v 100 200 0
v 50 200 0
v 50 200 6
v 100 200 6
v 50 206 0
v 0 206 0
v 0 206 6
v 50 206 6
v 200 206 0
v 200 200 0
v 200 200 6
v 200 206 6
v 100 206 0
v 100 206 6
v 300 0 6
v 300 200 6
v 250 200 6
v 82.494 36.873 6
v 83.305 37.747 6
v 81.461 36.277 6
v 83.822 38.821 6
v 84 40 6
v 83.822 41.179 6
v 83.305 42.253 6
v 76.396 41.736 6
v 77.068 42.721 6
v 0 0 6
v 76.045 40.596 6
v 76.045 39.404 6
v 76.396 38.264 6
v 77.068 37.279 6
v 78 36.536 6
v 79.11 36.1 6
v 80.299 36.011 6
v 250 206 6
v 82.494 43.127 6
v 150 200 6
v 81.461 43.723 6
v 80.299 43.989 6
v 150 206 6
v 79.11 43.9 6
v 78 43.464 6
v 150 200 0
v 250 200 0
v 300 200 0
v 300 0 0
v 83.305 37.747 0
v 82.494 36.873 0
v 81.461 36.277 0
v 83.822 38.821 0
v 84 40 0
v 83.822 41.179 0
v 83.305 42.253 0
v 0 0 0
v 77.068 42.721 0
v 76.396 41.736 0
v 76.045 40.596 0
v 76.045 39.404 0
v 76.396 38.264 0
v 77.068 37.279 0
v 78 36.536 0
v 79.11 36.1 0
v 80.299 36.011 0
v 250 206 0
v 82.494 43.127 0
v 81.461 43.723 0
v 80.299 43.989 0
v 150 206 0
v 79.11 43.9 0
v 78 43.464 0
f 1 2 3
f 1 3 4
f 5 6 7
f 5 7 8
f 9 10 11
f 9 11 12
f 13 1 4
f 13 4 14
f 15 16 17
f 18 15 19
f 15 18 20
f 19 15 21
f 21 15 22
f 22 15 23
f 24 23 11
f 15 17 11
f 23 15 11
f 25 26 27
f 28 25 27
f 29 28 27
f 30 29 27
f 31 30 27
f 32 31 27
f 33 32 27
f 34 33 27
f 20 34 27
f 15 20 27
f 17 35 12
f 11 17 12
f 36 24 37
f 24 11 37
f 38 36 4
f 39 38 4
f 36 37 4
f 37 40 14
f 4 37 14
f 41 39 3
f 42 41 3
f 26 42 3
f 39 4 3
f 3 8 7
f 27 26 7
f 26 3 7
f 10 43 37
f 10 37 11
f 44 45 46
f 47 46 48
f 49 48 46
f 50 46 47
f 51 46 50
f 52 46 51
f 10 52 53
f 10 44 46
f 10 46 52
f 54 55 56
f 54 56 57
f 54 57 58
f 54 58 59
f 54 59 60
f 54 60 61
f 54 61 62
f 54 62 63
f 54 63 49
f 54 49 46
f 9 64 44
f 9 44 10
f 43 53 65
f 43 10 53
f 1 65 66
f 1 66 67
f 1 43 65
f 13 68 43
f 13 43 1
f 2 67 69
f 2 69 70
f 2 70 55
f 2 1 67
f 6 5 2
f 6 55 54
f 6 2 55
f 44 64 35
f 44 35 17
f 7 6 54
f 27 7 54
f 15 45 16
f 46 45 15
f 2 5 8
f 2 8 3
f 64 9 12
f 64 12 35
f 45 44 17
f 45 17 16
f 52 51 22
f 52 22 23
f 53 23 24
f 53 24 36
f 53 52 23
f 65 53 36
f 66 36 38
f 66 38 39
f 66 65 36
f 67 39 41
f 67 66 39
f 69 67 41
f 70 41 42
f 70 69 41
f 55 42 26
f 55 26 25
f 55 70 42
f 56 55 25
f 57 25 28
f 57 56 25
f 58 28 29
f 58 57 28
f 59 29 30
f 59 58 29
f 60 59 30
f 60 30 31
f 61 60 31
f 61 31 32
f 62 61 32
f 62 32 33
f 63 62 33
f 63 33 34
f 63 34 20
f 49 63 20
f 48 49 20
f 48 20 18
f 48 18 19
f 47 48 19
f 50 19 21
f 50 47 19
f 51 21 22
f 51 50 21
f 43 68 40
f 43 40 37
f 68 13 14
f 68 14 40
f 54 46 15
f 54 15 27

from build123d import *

# Parameters (mm, degrees)
ESQUISSE1_R        = 4
BOSS_EXTRU_1_DEPTH = 6


with BuildPart() as part:
    # Esquisse1 → Boss.-Extru.1 (new body)
    with BuildSketch(Plane.XY):
        Polygon((0, 200), (0, 206), (50, 206), (50, 200), (100, 200), (100, 206), (150, 206), (150, 200), (200, 200), (200, 206), (250, 206), (250, 200), (300, 200), (300, 0), (0, 0), align=None)
        with Locations((80, 40)):
            Circle(ESQUISSE1_R, mode=Mode.SUBTRACT)
    extrude(amount=BOSS_EXTRU_1_DEPTH)


solid = part.part
